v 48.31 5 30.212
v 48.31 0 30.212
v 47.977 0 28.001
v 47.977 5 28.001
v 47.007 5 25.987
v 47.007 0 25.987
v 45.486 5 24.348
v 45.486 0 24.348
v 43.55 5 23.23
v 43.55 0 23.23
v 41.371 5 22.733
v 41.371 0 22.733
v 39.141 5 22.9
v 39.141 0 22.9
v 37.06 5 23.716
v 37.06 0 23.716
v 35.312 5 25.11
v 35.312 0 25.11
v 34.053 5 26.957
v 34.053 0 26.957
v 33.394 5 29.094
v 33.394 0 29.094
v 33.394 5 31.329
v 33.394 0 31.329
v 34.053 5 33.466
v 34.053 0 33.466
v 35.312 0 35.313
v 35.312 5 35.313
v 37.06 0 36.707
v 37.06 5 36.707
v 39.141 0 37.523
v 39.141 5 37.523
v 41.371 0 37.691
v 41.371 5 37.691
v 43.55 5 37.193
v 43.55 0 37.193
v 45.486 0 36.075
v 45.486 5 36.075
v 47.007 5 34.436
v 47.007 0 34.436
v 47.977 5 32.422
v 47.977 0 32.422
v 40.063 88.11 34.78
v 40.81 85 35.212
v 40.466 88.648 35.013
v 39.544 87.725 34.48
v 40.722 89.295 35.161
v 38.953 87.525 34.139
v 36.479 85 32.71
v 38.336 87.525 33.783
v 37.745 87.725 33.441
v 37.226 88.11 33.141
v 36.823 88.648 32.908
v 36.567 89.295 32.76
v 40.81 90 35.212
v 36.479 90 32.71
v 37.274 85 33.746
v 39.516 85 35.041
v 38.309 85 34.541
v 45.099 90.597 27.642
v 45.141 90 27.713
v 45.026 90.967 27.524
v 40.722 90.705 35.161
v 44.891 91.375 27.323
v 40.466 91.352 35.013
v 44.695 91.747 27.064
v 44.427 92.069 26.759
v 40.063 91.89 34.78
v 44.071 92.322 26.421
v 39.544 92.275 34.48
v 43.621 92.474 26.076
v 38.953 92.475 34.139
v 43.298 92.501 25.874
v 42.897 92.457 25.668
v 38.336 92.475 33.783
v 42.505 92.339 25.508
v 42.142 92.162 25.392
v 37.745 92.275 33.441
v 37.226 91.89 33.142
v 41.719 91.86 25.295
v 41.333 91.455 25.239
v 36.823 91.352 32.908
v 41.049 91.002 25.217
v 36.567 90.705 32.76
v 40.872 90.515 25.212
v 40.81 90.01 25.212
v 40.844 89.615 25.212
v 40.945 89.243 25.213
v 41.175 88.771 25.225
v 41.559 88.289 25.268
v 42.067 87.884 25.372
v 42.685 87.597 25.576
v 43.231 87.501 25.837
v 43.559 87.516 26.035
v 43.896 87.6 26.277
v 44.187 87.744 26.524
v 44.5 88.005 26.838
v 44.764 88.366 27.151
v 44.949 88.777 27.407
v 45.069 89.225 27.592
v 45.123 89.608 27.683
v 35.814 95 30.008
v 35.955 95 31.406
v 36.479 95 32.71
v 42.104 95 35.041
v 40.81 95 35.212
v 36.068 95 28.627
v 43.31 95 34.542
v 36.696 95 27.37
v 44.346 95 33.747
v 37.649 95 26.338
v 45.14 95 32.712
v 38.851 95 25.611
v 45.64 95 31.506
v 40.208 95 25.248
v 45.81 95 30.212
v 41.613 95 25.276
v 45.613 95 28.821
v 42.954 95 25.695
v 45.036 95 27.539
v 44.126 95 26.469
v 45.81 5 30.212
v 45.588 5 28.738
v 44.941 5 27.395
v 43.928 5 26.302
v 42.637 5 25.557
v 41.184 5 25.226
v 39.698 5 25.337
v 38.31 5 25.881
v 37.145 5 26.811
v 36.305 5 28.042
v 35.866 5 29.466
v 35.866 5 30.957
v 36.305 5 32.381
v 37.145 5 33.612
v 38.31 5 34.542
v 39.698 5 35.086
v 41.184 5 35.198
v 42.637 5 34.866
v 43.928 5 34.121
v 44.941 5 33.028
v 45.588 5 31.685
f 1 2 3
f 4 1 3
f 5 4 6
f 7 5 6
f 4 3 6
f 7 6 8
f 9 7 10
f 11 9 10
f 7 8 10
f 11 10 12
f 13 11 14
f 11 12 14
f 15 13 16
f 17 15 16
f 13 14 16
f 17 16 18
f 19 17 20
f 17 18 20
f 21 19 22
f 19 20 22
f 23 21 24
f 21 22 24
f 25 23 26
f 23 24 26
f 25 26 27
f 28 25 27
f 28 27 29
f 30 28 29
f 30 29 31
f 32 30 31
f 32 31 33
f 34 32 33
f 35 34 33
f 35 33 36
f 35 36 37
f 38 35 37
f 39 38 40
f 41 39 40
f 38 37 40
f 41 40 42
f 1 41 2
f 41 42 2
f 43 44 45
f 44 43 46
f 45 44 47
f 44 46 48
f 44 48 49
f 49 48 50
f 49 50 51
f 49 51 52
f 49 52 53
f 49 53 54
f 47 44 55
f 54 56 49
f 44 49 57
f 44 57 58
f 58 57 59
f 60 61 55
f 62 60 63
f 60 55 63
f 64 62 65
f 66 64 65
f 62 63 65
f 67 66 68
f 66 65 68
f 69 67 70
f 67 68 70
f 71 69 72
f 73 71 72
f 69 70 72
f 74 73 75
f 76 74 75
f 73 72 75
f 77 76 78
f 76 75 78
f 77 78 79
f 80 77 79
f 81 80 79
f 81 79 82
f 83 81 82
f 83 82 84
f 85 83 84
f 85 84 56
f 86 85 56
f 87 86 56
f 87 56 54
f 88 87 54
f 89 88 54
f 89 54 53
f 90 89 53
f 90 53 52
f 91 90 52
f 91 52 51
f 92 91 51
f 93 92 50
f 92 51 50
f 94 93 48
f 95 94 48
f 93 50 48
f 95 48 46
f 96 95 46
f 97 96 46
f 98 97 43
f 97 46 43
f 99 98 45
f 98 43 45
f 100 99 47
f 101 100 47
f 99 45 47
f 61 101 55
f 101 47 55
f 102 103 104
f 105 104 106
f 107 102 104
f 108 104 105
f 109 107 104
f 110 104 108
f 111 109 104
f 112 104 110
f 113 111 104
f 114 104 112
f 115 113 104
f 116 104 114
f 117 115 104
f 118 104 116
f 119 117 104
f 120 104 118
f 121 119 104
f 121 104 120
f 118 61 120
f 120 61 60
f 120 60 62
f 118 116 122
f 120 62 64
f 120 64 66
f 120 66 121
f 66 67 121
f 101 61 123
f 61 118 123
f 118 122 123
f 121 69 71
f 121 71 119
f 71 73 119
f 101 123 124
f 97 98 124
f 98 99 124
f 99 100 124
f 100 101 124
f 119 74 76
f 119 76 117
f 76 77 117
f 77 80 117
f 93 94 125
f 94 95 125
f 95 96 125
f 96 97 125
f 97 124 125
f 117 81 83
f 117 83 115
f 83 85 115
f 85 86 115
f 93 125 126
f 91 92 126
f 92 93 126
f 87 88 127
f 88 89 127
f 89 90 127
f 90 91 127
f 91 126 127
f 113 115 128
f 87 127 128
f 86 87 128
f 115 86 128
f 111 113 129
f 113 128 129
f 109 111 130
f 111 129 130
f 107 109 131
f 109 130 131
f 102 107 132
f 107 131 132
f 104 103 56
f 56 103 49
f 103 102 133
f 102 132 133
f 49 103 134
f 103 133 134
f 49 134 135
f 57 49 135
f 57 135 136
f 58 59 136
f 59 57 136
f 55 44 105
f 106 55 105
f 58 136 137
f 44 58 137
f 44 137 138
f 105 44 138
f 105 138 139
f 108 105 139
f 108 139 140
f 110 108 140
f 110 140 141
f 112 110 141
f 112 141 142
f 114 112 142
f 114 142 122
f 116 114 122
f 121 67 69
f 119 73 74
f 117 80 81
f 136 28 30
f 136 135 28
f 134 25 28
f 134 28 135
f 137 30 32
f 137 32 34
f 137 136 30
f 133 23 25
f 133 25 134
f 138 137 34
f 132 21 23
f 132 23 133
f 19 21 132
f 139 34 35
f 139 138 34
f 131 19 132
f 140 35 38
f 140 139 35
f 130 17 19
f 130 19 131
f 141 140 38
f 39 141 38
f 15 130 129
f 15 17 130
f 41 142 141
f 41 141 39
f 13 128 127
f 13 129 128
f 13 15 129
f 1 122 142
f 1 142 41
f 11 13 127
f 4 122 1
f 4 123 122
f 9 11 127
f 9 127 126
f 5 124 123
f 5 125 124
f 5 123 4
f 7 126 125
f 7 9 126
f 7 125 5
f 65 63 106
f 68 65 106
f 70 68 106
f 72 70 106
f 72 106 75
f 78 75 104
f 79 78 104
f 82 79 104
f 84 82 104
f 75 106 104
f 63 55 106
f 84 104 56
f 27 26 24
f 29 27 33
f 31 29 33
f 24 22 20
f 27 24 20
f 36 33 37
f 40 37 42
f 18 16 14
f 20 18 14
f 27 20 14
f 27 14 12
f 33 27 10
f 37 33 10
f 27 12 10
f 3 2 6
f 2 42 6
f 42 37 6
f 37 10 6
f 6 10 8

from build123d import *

# Parameters (mm, degrees)
SKETCH_1_R          = 7.5
EXTRUDE_1_DEPTH     = 5
SKETCH_2_R          = 5
EXTRUDE_2_DEPTH     = 90
CUT_EXTRUDE_1_DEPTH = 10
SKETCH_13_R         = 2.500883101
CUT_EXTRUDE_2_DEPTH = 10


with BuildPart() as part:
    # Эскиз1 → Бобышка-Вытянуть1 (new body)
    with BuildSketch(Plane(origin=(0, 0, 0), x_dir=(1, 0, 0), z_dir=(0, 1, 0))):
        with Locations((40.81014851, -30.211534636)):
            Circle(SKETCH_1_R)
    extrude(amount=EXTRUDE_1_DEPTH)

    # Эскиз2 → Бобышка-Вытянуть2 (add)
    with BuildSketch(Plane(origin=(0, 5, 0), x_dir=(1, 0, 0), z_dir=(0, 1, 0))):
        with Locations((40.81014851, -30.211534636)):
            Circle(SKETCH_2_R)
    extrude(amount=EXTRUDE_2_DEPTH)

    # Эскиз12 → Вырез-Вытянуть1 (cut)
    with BuildSketch(Plane(origin=(0, 95, 0), x_dir=(1, 0, 0), z_dir=(0, 1, 0))):
        Polygon((40.81014851, -35.211534636), (36.479002075, -32.709768123), (36.139784444, -33.297033651), (40.47093088, -35.798800164), align=None)
    extrude(amount=-CUT_EXTRUDE_1_DEPTH, mode=Mode.SUBTRACT)

    # Эскиз13 → Вырез-Вытянуть2 (cut)
    with BuildSketch(Plane(origin=(-5.040884978, 0, 8.726957886), x_dir=(0.865923408, 0, 0.50017662), z_dir=(-0.50017662, 0, 0.865923408))):
        with Locations((50.449566166, 90)):
            Circle(SKETCH_13_R)
    extrude(amount=-CUT_EXTRUDE_2_DEPTH, mode=Mode.SUBTRACT)


solid = part.part
